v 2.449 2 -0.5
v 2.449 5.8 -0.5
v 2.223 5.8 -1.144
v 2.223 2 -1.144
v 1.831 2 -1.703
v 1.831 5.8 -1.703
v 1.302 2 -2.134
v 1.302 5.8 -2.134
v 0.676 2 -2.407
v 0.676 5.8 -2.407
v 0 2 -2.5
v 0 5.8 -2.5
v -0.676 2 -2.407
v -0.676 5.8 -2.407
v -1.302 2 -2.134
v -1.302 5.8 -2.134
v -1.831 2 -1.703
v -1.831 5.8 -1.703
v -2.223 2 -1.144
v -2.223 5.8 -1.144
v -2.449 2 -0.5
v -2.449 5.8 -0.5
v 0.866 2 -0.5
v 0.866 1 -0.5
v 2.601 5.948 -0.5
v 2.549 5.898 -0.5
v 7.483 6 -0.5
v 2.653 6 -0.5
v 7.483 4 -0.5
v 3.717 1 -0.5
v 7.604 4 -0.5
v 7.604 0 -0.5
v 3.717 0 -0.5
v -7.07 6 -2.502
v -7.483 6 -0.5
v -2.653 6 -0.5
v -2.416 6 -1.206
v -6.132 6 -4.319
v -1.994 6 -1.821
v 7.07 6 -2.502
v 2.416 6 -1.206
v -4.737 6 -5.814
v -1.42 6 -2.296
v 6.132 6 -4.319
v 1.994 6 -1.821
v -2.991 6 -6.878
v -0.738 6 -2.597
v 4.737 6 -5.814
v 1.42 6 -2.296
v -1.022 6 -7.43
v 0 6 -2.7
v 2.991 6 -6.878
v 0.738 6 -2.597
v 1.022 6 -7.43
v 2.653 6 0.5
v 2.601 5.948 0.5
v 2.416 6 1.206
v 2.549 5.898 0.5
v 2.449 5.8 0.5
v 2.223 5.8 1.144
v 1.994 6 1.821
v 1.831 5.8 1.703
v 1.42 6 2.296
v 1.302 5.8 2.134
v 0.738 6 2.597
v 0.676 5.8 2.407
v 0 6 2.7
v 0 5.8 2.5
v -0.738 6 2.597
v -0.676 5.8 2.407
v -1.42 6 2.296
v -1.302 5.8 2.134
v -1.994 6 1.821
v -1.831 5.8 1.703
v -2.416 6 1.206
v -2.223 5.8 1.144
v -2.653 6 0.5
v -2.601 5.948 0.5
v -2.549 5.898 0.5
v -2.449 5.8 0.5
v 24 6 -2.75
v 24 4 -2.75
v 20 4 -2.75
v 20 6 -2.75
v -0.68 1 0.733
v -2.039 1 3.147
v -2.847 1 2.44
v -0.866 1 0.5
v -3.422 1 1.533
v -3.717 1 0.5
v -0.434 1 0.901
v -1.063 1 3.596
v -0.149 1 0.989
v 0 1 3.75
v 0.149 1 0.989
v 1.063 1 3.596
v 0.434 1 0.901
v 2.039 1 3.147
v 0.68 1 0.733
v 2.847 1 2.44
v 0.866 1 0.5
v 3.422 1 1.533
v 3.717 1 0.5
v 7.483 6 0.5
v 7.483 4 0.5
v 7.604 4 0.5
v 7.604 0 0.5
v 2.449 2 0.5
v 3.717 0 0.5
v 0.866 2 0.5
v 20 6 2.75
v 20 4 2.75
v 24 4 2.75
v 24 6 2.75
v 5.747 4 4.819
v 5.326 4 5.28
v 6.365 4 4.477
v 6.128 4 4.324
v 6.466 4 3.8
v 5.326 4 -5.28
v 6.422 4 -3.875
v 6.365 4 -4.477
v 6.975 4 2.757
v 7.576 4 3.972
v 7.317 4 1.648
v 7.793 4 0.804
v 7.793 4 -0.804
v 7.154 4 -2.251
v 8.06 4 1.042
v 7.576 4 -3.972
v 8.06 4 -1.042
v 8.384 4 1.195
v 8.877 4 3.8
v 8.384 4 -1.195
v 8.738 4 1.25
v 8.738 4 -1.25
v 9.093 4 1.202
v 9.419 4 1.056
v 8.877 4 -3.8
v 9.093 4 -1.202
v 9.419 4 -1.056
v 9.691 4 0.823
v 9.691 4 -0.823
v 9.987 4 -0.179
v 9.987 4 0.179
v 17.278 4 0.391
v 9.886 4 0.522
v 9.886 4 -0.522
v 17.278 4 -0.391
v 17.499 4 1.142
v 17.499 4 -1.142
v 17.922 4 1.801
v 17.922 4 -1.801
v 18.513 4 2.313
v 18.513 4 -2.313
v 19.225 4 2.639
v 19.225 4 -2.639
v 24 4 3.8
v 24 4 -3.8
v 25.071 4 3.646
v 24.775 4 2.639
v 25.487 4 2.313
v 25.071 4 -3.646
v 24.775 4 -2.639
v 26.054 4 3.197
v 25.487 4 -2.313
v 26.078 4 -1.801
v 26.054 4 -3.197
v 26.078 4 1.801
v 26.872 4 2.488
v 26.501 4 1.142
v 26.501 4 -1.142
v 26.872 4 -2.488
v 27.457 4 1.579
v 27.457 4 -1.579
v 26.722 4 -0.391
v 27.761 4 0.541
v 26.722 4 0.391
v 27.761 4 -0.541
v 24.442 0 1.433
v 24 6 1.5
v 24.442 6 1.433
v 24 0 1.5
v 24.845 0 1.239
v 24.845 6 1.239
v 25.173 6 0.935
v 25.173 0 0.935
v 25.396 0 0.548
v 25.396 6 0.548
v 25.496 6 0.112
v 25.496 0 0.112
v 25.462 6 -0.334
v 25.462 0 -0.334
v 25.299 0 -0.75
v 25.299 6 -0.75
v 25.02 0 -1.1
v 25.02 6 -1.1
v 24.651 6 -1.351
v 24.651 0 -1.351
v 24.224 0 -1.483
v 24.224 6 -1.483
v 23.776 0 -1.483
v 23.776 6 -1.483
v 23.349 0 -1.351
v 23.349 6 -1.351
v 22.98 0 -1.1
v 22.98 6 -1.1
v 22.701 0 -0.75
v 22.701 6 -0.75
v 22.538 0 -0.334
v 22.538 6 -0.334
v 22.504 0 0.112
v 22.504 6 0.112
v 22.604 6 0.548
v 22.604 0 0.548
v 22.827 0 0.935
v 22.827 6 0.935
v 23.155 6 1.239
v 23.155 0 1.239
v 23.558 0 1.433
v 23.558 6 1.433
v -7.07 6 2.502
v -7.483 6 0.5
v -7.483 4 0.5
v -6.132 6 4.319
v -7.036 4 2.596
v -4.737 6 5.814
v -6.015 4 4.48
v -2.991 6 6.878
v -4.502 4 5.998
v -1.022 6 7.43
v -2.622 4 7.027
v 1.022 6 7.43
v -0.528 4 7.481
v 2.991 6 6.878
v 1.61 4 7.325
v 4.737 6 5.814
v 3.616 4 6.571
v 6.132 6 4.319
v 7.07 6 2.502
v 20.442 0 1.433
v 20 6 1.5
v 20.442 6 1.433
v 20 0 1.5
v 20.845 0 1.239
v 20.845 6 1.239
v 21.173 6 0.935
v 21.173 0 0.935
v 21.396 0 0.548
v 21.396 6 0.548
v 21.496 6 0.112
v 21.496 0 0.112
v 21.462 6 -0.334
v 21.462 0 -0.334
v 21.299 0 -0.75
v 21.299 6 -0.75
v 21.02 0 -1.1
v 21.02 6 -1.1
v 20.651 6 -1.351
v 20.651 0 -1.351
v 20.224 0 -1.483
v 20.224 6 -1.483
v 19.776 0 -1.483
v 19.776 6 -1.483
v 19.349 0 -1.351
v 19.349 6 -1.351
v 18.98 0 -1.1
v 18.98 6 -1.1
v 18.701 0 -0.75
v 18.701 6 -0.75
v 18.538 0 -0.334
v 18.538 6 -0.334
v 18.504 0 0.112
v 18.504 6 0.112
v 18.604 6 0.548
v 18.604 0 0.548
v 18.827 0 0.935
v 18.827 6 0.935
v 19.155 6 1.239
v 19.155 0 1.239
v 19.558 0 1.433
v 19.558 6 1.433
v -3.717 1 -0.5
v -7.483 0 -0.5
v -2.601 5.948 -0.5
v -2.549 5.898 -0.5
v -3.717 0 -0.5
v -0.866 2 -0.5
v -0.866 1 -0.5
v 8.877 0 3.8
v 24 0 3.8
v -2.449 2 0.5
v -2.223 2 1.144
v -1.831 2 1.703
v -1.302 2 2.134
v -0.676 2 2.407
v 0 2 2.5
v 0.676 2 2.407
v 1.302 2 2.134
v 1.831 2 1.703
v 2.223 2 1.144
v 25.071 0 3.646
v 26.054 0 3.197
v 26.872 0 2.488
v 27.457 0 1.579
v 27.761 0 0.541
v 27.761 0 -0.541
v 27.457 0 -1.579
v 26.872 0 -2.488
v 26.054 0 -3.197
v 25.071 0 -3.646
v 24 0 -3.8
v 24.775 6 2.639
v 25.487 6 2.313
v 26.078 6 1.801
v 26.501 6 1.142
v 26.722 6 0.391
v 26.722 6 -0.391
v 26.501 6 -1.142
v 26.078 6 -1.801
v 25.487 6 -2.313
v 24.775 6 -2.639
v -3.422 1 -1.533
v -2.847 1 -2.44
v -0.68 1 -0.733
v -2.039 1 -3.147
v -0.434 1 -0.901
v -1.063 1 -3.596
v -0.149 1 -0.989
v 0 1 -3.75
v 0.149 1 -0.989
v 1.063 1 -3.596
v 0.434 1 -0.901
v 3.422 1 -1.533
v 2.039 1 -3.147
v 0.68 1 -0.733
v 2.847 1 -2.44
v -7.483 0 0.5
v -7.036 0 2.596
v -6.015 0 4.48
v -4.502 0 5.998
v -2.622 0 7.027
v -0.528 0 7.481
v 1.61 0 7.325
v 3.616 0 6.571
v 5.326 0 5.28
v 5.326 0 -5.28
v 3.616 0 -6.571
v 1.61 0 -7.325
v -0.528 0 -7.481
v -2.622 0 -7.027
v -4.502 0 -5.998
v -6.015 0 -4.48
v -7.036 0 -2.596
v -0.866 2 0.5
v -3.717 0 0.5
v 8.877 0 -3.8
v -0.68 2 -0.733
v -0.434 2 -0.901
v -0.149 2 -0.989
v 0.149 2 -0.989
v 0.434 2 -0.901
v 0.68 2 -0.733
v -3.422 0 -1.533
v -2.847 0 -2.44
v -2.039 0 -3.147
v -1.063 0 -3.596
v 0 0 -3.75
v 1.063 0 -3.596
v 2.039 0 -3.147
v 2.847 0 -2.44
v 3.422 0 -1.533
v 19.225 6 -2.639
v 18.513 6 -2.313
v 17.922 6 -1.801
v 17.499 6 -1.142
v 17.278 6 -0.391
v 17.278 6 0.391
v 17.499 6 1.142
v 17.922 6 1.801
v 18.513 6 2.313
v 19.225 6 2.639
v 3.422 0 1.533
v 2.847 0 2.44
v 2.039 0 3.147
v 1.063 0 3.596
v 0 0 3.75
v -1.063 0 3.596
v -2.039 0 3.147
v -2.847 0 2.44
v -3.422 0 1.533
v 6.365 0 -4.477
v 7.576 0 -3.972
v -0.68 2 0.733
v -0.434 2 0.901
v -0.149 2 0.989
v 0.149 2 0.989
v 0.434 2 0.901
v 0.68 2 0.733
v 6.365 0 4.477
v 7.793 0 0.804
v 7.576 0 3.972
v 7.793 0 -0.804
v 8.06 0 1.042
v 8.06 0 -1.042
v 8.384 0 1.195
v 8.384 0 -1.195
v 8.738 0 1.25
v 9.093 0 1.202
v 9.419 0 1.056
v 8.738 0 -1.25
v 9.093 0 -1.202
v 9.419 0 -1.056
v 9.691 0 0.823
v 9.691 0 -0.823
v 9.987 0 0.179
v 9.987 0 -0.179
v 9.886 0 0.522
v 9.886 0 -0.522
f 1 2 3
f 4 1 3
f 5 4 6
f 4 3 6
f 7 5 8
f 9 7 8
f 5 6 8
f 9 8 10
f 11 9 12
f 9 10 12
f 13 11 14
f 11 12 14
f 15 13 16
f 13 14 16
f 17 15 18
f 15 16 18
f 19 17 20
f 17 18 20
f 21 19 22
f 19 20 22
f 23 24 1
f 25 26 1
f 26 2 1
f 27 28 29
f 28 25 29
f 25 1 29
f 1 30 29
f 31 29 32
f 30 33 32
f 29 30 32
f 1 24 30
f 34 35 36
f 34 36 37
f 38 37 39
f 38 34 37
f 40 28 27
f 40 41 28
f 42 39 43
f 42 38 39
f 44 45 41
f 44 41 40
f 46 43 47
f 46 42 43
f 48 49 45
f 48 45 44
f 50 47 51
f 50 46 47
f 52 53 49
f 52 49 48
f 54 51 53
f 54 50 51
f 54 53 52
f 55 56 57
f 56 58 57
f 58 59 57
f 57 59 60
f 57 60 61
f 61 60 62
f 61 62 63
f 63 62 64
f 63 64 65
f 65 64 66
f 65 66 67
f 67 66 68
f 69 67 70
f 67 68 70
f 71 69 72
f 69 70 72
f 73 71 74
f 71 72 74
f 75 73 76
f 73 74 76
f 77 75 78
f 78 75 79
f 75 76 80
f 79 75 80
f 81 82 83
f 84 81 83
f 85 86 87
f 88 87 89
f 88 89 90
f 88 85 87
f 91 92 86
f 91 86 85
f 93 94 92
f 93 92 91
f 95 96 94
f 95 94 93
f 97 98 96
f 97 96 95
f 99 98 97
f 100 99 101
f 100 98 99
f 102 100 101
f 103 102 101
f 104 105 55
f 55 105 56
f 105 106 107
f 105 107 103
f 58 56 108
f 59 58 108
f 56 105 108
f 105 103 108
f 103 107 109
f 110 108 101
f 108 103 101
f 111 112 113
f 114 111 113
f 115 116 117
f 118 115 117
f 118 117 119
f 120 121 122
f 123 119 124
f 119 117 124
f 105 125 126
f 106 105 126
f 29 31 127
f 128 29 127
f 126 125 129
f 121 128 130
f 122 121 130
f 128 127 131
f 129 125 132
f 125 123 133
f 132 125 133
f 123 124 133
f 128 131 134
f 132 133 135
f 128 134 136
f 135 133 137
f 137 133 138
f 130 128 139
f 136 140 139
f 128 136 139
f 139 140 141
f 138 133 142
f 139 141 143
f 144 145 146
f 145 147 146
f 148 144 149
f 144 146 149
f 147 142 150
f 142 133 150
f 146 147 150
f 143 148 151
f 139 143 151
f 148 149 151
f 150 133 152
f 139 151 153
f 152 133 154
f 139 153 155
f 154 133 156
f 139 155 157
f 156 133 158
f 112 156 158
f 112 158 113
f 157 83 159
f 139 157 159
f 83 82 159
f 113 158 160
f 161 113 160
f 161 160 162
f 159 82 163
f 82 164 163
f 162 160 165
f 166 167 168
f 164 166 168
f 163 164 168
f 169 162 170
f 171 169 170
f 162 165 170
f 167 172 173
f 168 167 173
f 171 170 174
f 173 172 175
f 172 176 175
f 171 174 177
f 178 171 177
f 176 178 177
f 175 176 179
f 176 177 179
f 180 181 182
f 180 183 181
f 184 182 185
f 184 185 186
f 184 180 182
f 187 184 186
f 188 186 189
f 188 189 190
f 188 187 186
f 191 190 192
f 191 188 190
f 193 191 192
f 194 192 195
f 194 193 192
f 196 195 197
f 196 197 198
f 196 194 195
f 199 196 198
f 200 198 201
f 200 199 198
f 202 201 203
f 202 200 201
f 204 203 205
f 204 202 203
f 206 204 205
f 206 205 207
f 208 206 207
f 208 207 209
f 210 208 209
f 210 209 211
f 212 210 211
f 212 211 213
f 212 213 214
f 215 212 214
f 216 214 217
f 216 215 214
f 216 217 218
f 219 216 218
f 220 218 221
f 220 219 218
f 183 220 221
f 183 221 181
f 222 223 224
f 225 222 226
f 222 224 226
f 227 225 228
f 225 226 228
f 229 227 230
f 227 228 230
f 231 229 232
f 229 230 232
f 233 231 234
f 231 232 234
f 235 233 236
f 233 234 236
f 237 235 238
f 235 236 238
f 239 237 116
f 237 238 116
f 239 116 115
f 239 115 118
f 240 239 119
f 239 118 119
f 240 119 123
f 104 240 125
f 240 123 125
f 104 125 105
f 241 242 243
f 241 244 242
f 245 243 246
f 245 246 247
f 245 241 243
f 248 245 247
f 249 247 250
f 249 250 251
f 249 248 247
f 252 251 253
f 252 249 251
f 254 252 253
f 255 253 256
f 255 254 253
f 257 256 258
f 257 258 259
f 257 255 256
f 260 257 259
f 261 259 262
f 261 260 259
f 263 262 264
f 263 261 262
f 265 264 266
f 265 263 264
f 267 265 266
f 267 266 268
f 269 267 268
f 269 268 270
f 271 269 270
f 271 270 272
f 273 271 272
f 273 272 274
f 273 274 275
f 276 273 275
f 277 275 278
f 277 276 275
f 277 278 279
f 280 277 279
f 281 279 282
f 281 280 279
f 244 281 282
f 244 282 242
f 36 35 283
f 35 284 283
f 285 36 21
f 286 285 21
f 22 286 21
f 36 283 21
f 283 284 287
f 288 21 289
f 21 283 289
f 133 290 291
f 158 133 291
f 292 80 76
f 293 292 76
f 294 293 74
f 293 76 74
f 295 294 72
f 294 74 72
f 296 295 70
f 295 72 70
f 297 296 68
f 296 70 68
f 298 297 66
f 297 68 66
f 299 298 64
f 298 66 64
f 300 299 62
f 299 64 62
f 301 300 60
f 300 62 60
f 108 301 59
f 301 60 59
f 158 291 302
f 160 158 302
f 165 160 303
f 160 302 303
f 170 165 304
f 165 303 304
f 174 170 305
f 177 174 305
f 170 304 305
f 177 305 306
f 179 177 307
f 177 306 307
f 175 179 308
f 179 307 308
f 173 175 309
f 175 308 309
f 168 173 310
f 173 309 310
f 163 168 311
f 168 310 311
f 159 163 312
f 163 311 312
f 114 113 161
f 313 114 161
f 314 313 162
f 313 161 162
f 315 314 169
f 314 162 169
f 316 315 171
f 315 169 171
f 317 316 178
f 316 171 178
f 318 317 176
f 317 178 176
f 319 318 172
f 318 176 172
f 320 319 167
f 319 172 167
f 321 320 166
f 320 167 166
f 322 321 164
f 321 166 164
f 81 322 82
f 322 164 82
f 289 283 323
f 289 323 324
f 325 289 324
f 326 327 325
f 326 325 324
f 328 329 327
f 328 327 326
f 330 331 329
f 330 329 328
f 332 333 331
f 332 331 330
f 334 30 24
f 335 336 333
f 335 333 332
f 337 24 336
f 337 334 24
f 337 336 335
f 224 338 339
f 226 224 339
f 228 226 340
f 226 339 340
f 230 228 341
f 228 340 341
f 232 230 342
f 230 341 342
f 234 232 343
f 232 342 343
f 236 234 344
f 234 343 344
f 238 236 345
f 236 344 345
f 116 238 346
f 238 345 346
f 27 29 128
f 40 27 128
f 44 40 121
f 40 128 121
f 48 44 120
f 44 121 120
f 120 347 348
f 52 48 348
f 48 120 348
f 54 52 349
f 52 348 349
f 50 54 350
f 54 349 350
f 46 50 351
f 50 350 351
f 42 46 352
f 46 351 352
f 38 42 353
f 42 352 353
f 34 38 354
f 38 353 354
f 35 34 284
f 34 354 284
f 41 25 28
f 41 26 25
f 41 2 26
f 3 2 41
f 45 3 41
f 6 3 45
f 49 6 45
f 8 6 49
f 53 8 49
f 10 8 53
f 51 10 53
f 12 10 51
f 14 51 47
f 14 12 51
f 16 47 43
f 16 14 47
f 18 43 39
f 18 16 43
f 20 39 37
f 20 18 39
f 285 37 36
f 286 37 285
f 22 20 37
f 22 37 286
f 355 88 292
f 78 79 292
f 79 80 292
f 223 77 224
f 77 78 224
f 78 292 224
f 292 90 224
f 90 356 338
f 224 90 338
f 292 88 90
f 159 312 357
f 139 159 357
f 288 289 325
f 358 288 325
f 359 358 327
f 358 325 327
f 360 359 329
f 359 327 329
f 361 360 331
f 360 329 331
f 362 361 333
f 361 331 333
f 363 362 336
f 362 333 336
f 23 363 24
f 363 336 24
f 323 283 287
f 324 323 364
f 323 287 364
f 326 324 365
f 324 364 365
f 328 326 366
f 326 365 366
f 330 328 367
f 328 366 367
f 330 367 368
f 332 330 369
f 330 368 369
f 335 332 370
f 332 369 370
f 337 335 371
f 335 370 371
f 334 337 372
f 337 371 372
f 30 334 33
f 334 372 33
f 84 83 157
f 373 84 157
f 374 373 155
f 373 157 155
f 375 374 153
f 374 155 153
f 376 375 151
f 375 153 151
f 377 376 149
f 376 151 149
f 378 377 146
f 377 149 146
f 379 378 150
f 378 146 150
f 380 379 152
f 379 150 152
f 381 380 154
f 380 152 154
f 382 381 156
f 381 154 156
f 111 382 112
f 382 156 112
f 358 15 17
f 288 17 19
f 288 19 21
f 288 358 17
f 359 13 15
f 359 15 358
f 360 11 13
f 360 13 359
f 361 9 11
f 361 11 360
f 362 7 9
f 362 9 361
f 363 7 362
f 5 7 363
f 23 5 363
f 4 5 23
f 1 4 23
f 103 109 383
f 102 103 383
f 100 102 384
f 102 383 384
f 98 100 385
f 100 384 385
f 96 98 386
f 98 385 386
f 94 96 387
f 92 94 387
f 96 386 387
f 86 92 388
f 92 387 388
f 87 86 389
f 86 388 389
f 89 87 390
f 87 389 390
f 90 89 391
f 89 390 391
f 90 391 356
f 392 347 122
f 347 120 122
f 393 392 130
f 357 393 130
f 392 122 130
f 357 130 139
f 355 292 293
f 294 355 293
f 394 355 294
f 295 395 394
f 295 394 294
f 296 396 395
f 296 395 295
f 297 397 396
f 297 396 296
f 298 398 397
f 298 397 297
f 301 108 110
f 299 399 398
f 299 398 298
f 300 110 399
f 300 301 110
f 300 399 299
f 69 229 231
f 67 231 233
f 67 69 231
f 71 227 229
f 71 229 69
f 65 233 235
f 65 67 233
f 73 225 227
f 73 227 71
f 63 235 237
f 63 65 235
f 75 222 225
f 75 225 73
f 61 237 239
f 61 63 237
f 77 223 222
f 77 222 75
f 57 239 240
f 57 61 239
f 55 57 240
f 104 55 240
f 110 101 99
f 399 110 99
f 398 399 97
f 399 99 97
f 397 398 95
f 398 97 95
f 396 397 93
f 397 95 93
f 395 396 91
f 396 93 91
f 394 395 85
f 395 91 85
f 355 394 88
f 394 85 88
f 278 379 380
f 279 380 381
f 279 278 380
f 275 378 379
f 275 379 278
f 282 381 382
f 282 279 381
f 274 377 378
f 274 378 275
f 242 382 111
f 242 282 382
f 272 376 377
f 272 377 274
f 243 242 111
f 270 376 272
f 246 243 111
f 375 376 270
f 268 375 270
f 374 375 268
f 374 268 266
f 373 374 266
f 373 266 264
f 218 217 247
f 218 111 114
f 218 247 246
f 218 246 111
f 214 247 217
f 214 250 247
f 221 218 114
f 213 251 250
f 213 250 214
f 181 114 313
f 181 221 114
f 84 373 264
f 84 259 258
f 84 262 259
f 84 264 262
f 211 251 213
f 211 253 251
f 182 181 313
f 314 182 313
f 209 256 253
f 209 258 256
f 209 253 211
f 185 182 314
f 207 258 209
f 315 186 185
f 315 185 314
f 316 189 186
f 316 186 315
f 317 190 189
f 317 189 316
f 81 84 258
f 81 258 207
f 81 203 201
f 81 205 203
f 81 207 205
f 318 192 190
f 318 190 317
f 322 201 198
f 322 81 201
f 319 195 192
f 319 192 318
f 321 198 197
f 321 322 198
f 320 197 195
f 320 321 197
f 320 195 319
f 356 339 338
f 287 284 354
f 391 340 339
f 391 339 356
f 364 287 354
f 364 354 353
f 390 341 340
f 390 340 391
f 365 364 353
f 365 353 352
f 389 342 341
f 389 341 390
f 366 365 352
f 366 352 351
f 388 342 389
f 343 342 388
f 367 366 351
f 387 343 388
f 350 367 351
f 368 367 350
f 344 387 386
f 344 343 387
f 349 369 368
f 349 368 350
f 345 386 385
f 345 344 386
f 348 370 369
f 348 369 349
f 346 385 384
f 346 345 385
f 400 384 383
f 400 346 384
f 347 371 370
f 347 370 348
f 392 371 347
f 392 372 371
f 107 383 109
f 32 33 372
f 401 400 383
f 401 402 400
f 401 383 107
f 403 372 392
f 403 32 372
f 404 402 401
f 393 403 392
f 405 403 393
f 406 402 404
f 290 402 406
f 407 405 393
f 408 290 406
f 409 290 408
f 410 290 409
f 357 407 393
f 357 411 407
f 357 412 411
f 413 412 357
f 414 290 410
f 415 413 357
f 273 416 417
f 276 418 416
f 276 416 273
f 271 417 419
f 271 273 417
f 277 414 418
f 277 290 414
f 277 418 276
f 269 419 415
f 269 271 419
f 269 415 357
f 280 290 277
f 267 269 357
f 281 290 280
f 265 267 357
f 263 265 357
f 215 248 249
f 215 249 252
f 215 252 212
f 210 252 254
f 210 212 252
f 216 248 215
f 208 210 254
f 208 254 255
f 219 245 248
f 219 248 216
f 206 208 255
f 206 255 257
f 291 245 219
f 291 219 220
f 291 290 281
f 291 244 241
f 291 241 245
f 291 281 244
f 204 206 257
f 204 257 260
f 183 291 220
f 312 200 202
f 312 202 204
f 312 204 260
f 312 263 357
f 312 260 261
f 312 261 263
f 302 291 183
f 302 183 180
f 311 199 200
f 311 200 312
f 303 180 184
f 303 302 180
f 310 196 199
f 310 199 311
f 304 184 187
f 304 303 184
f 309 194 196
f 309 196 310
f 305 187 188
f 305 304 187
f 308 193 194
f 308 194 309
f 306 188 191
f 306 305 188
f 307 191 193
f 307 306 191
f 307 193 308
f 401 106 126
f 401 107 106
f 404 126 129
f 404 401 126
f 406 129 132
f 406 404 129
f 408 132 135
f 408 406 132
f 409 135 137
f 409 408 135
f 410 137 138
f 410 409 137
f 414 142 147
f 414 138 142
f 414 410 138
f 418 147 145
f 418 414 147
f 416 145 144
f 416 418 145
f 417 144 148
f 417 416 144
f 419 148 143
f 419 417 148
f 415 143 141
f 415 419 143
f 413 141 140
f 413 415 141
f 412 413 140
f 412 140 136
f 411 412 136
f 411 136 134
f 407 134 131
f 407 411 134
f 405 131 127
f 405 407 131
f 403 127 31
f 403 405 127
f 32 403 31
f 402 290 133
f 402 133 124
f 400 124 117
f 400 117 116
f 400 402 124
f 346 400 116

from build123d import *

# Parameters (mm, degrees)
SKETCH1_R           = 1.2499999999999998
SKETCH1_R_2         = 1.5000000000000007
BOSS_EXTRUDE2_DEPTH = 4
SKETCH2_R           = 7.5
BOSS_EXTRUDE3_DEPTH = 2
SKETCH3_R           = 1.4999999999999967
BOSS_EXTRUDE4_DEPTH = 2
SKETCH4_R           = 2.5
CUT_EXTRUDE1_DEPTH  = 4
SKETCH5_R           = 1
CUT_EXTRUDE2_DEPTH  = 30.412412345810736
SKETCH6_R           = 3.75
CUT_EXTRUDE3_DEPTH  = 1
CUT_EXTRUDE4_DEPTH  = 30.412412345810736
FILLET2_R           = 5
FILLET3_R           = 5
CHAMFER1_SIZE       = 0.2


with BuildPart() as part:
    # Sketch1 → Boss-Extrude2 (new body)
    with BuildSketch(Plane(origin=(0, 0, 0), x_dir=(1, 0, 0), z_dir=(0, 1, 0))):
        with BuildLine():
            ThreePointArc((24, -3.8000000000000003), (27.799999999999997, 6e-17), (24, 3.8000000000000003))
            Line((24, 3.8), (6.466065264130883, 3.8))
            ThreePointArc((6.466065264130884, 3.8000000000000003), (-7.5, 9.2e-16), (6.466065264130884, -3.800000000000001))
            Line((6.466065264130883, -3.7999999999999994), (24, -3.7999999999999994))
        make_face()
        with Locations((8.75, -6.7e-16)):
            Circle(SKETCH1_R, mode=Mode.SUBTRACT)
        with Locations((20, 0)):
            Circle(SKETCH1_R_2, mode=Mode.SUBTRACT)
        with Locations((24, 0)):
            Circle(SKETCH1_R_2, mode=Mode.SUBTRACT)
    extrude(amount=BOSS_EXTRUDE2_DEPTH)

    # Sketch2 → Boss-Extrude3 (add)
    with BuildSketch(Plane(origin=(0, 4, 0), x_dir=(1, 0, 0), z_dir=(0, 1, 0))):
        Circle(SKETCH2_R)
    extrude(amount=BOSS_EXTRUDE3_DEPTH)

    # Sketch3 → Boss-Extrude4 (add)
    with BuildSketch(Plane(origin=(0, 4, 0), x_dir=(1, 0, 0), z_dir=(0, 1, 0))):
        with BuildLine():
            ThreePointArc((26.75, -5.5e-16), (25.944543648263004, 1.9445436482630067), (23.999999999999996, 2.75))
            Line((23.999999999999996, 2.7500000000000004), (19.999999999999996, 2.7500000000000004))
            ThreePointArc((19.999999999999996, 2.7500000000000004), (18.05545635173699, 1.9445436482630059), (17.249999999999996, -3.3e-16))
            ThreePointArc((17.249999999999996, -3.3e-16), (18.055456351736993, -1.9445436482630054), (19.999999999999996, -2.7499999999999996))
            Line((19.999999999999996, -2.7499999999999996), (23.999999999999996, -2.7500000000000004))
            ThreePointArc((23.999999999999996, -2.75), (25.944543648263004, -1.9445436482630074), (26.75, 6e-17))
        make_face()
        with BuildLine():
            ThreePointArc((21.499999999999996, 7e-17), (19.999999999999996, -1.5000000000000002), (18.499999999999996, 6.2e-16))
            ThreePointArc((18.499999999999996, 6.2e-16), (19.999999999999996, 1.500000000000001), (21.499999999999996, 4.3e-16))
        make_face(mode=Mode.SUBTRACT)
        with Locations((23.999999999999996, 0)):
            Circle(SKETCH3_R, mode=Mode.SUBTRACT)
    extrude(amount=BOSS_EXTRUDE4_DEPTH)

    # Sketch4 → Cut-Extrude1 (cut)
    with BuildSketch(Plane(origin=(0, 6, 0), x_dir=(1, 0, 0), z_dir=(0, 1, 0))):
        Circle(SKETCH4_R)
    extrude(amount=-CUT_EXTRUDE1_DEPTH, mode=Mode.SUBTRACT)

    # Sketch5 → Cut-Extrude2 (cut, through all)
    with BuildSketch(Plane(origin=(0, 0, 0), x_dir=(-1, 0, 0), z_dir=(0, -1, 0))):
        Circle(SKETCH5_R)
    extrude(amount=-CUT_EXTRUDE2_DEPTH, mode=Mode.SUBTRACT)

    # Sketch6 → Cut-Extrude3 (cut)
    with BuildSketch(Plane(origin=(0, 0, 0), x_dir=(-1, 0, 0), z_dir=(0, -1, 0))):
        Circle(SKETCH6_R)
    extrude(amount=-CUT_EXTRUDE3_DEPTH, mode=Mode.SUBTRACT)

    # Sketch7 → Cut-Extrude4 (cut, through all)
    with BuildSketch(Plane(origin=(0, 0, 0), x_dir=(-1, 0, 0), z_dir=(0, -1, 0))):
        Polygon((-8.75, 0), (-8.75, -0.5), (10.385226010390808, -0.5), (10.385226010390808, 0.5), (-8.75, 0.5), align=None)
    extrude(amount=-CUT_EXTRUDE4_DEPTH, mode=Mode.SUBTRACT)

    # Fillet2
    fillet2_edges = [part.edges().sort_by_distance(p)[0] for p in [
        (6.466065264130883, 2, -3.8),
    ]]
    fillet(fillet2_edges, radius=FILLET2_R)

    # Fillet3
    fillet3_edges = [part.edges().sort_by_distance(p)[0] for p in [
        (6.466065264130884, 2, 3.799999999999999),
    ]]
    fillet(fillet3_edges, radius=FILLET3_R)

    # Chamfer1
    chamfer1_edges = [part.edges().sort_by_distance(p)[0] for p in [
        (1.5e-16, 6, -2.5),
        (-4.6e-16, 6, 2.5),
    ]]
    chamfer(chamfer1_edges, length=CHAMFER1_SIZE)


solid = part.part
